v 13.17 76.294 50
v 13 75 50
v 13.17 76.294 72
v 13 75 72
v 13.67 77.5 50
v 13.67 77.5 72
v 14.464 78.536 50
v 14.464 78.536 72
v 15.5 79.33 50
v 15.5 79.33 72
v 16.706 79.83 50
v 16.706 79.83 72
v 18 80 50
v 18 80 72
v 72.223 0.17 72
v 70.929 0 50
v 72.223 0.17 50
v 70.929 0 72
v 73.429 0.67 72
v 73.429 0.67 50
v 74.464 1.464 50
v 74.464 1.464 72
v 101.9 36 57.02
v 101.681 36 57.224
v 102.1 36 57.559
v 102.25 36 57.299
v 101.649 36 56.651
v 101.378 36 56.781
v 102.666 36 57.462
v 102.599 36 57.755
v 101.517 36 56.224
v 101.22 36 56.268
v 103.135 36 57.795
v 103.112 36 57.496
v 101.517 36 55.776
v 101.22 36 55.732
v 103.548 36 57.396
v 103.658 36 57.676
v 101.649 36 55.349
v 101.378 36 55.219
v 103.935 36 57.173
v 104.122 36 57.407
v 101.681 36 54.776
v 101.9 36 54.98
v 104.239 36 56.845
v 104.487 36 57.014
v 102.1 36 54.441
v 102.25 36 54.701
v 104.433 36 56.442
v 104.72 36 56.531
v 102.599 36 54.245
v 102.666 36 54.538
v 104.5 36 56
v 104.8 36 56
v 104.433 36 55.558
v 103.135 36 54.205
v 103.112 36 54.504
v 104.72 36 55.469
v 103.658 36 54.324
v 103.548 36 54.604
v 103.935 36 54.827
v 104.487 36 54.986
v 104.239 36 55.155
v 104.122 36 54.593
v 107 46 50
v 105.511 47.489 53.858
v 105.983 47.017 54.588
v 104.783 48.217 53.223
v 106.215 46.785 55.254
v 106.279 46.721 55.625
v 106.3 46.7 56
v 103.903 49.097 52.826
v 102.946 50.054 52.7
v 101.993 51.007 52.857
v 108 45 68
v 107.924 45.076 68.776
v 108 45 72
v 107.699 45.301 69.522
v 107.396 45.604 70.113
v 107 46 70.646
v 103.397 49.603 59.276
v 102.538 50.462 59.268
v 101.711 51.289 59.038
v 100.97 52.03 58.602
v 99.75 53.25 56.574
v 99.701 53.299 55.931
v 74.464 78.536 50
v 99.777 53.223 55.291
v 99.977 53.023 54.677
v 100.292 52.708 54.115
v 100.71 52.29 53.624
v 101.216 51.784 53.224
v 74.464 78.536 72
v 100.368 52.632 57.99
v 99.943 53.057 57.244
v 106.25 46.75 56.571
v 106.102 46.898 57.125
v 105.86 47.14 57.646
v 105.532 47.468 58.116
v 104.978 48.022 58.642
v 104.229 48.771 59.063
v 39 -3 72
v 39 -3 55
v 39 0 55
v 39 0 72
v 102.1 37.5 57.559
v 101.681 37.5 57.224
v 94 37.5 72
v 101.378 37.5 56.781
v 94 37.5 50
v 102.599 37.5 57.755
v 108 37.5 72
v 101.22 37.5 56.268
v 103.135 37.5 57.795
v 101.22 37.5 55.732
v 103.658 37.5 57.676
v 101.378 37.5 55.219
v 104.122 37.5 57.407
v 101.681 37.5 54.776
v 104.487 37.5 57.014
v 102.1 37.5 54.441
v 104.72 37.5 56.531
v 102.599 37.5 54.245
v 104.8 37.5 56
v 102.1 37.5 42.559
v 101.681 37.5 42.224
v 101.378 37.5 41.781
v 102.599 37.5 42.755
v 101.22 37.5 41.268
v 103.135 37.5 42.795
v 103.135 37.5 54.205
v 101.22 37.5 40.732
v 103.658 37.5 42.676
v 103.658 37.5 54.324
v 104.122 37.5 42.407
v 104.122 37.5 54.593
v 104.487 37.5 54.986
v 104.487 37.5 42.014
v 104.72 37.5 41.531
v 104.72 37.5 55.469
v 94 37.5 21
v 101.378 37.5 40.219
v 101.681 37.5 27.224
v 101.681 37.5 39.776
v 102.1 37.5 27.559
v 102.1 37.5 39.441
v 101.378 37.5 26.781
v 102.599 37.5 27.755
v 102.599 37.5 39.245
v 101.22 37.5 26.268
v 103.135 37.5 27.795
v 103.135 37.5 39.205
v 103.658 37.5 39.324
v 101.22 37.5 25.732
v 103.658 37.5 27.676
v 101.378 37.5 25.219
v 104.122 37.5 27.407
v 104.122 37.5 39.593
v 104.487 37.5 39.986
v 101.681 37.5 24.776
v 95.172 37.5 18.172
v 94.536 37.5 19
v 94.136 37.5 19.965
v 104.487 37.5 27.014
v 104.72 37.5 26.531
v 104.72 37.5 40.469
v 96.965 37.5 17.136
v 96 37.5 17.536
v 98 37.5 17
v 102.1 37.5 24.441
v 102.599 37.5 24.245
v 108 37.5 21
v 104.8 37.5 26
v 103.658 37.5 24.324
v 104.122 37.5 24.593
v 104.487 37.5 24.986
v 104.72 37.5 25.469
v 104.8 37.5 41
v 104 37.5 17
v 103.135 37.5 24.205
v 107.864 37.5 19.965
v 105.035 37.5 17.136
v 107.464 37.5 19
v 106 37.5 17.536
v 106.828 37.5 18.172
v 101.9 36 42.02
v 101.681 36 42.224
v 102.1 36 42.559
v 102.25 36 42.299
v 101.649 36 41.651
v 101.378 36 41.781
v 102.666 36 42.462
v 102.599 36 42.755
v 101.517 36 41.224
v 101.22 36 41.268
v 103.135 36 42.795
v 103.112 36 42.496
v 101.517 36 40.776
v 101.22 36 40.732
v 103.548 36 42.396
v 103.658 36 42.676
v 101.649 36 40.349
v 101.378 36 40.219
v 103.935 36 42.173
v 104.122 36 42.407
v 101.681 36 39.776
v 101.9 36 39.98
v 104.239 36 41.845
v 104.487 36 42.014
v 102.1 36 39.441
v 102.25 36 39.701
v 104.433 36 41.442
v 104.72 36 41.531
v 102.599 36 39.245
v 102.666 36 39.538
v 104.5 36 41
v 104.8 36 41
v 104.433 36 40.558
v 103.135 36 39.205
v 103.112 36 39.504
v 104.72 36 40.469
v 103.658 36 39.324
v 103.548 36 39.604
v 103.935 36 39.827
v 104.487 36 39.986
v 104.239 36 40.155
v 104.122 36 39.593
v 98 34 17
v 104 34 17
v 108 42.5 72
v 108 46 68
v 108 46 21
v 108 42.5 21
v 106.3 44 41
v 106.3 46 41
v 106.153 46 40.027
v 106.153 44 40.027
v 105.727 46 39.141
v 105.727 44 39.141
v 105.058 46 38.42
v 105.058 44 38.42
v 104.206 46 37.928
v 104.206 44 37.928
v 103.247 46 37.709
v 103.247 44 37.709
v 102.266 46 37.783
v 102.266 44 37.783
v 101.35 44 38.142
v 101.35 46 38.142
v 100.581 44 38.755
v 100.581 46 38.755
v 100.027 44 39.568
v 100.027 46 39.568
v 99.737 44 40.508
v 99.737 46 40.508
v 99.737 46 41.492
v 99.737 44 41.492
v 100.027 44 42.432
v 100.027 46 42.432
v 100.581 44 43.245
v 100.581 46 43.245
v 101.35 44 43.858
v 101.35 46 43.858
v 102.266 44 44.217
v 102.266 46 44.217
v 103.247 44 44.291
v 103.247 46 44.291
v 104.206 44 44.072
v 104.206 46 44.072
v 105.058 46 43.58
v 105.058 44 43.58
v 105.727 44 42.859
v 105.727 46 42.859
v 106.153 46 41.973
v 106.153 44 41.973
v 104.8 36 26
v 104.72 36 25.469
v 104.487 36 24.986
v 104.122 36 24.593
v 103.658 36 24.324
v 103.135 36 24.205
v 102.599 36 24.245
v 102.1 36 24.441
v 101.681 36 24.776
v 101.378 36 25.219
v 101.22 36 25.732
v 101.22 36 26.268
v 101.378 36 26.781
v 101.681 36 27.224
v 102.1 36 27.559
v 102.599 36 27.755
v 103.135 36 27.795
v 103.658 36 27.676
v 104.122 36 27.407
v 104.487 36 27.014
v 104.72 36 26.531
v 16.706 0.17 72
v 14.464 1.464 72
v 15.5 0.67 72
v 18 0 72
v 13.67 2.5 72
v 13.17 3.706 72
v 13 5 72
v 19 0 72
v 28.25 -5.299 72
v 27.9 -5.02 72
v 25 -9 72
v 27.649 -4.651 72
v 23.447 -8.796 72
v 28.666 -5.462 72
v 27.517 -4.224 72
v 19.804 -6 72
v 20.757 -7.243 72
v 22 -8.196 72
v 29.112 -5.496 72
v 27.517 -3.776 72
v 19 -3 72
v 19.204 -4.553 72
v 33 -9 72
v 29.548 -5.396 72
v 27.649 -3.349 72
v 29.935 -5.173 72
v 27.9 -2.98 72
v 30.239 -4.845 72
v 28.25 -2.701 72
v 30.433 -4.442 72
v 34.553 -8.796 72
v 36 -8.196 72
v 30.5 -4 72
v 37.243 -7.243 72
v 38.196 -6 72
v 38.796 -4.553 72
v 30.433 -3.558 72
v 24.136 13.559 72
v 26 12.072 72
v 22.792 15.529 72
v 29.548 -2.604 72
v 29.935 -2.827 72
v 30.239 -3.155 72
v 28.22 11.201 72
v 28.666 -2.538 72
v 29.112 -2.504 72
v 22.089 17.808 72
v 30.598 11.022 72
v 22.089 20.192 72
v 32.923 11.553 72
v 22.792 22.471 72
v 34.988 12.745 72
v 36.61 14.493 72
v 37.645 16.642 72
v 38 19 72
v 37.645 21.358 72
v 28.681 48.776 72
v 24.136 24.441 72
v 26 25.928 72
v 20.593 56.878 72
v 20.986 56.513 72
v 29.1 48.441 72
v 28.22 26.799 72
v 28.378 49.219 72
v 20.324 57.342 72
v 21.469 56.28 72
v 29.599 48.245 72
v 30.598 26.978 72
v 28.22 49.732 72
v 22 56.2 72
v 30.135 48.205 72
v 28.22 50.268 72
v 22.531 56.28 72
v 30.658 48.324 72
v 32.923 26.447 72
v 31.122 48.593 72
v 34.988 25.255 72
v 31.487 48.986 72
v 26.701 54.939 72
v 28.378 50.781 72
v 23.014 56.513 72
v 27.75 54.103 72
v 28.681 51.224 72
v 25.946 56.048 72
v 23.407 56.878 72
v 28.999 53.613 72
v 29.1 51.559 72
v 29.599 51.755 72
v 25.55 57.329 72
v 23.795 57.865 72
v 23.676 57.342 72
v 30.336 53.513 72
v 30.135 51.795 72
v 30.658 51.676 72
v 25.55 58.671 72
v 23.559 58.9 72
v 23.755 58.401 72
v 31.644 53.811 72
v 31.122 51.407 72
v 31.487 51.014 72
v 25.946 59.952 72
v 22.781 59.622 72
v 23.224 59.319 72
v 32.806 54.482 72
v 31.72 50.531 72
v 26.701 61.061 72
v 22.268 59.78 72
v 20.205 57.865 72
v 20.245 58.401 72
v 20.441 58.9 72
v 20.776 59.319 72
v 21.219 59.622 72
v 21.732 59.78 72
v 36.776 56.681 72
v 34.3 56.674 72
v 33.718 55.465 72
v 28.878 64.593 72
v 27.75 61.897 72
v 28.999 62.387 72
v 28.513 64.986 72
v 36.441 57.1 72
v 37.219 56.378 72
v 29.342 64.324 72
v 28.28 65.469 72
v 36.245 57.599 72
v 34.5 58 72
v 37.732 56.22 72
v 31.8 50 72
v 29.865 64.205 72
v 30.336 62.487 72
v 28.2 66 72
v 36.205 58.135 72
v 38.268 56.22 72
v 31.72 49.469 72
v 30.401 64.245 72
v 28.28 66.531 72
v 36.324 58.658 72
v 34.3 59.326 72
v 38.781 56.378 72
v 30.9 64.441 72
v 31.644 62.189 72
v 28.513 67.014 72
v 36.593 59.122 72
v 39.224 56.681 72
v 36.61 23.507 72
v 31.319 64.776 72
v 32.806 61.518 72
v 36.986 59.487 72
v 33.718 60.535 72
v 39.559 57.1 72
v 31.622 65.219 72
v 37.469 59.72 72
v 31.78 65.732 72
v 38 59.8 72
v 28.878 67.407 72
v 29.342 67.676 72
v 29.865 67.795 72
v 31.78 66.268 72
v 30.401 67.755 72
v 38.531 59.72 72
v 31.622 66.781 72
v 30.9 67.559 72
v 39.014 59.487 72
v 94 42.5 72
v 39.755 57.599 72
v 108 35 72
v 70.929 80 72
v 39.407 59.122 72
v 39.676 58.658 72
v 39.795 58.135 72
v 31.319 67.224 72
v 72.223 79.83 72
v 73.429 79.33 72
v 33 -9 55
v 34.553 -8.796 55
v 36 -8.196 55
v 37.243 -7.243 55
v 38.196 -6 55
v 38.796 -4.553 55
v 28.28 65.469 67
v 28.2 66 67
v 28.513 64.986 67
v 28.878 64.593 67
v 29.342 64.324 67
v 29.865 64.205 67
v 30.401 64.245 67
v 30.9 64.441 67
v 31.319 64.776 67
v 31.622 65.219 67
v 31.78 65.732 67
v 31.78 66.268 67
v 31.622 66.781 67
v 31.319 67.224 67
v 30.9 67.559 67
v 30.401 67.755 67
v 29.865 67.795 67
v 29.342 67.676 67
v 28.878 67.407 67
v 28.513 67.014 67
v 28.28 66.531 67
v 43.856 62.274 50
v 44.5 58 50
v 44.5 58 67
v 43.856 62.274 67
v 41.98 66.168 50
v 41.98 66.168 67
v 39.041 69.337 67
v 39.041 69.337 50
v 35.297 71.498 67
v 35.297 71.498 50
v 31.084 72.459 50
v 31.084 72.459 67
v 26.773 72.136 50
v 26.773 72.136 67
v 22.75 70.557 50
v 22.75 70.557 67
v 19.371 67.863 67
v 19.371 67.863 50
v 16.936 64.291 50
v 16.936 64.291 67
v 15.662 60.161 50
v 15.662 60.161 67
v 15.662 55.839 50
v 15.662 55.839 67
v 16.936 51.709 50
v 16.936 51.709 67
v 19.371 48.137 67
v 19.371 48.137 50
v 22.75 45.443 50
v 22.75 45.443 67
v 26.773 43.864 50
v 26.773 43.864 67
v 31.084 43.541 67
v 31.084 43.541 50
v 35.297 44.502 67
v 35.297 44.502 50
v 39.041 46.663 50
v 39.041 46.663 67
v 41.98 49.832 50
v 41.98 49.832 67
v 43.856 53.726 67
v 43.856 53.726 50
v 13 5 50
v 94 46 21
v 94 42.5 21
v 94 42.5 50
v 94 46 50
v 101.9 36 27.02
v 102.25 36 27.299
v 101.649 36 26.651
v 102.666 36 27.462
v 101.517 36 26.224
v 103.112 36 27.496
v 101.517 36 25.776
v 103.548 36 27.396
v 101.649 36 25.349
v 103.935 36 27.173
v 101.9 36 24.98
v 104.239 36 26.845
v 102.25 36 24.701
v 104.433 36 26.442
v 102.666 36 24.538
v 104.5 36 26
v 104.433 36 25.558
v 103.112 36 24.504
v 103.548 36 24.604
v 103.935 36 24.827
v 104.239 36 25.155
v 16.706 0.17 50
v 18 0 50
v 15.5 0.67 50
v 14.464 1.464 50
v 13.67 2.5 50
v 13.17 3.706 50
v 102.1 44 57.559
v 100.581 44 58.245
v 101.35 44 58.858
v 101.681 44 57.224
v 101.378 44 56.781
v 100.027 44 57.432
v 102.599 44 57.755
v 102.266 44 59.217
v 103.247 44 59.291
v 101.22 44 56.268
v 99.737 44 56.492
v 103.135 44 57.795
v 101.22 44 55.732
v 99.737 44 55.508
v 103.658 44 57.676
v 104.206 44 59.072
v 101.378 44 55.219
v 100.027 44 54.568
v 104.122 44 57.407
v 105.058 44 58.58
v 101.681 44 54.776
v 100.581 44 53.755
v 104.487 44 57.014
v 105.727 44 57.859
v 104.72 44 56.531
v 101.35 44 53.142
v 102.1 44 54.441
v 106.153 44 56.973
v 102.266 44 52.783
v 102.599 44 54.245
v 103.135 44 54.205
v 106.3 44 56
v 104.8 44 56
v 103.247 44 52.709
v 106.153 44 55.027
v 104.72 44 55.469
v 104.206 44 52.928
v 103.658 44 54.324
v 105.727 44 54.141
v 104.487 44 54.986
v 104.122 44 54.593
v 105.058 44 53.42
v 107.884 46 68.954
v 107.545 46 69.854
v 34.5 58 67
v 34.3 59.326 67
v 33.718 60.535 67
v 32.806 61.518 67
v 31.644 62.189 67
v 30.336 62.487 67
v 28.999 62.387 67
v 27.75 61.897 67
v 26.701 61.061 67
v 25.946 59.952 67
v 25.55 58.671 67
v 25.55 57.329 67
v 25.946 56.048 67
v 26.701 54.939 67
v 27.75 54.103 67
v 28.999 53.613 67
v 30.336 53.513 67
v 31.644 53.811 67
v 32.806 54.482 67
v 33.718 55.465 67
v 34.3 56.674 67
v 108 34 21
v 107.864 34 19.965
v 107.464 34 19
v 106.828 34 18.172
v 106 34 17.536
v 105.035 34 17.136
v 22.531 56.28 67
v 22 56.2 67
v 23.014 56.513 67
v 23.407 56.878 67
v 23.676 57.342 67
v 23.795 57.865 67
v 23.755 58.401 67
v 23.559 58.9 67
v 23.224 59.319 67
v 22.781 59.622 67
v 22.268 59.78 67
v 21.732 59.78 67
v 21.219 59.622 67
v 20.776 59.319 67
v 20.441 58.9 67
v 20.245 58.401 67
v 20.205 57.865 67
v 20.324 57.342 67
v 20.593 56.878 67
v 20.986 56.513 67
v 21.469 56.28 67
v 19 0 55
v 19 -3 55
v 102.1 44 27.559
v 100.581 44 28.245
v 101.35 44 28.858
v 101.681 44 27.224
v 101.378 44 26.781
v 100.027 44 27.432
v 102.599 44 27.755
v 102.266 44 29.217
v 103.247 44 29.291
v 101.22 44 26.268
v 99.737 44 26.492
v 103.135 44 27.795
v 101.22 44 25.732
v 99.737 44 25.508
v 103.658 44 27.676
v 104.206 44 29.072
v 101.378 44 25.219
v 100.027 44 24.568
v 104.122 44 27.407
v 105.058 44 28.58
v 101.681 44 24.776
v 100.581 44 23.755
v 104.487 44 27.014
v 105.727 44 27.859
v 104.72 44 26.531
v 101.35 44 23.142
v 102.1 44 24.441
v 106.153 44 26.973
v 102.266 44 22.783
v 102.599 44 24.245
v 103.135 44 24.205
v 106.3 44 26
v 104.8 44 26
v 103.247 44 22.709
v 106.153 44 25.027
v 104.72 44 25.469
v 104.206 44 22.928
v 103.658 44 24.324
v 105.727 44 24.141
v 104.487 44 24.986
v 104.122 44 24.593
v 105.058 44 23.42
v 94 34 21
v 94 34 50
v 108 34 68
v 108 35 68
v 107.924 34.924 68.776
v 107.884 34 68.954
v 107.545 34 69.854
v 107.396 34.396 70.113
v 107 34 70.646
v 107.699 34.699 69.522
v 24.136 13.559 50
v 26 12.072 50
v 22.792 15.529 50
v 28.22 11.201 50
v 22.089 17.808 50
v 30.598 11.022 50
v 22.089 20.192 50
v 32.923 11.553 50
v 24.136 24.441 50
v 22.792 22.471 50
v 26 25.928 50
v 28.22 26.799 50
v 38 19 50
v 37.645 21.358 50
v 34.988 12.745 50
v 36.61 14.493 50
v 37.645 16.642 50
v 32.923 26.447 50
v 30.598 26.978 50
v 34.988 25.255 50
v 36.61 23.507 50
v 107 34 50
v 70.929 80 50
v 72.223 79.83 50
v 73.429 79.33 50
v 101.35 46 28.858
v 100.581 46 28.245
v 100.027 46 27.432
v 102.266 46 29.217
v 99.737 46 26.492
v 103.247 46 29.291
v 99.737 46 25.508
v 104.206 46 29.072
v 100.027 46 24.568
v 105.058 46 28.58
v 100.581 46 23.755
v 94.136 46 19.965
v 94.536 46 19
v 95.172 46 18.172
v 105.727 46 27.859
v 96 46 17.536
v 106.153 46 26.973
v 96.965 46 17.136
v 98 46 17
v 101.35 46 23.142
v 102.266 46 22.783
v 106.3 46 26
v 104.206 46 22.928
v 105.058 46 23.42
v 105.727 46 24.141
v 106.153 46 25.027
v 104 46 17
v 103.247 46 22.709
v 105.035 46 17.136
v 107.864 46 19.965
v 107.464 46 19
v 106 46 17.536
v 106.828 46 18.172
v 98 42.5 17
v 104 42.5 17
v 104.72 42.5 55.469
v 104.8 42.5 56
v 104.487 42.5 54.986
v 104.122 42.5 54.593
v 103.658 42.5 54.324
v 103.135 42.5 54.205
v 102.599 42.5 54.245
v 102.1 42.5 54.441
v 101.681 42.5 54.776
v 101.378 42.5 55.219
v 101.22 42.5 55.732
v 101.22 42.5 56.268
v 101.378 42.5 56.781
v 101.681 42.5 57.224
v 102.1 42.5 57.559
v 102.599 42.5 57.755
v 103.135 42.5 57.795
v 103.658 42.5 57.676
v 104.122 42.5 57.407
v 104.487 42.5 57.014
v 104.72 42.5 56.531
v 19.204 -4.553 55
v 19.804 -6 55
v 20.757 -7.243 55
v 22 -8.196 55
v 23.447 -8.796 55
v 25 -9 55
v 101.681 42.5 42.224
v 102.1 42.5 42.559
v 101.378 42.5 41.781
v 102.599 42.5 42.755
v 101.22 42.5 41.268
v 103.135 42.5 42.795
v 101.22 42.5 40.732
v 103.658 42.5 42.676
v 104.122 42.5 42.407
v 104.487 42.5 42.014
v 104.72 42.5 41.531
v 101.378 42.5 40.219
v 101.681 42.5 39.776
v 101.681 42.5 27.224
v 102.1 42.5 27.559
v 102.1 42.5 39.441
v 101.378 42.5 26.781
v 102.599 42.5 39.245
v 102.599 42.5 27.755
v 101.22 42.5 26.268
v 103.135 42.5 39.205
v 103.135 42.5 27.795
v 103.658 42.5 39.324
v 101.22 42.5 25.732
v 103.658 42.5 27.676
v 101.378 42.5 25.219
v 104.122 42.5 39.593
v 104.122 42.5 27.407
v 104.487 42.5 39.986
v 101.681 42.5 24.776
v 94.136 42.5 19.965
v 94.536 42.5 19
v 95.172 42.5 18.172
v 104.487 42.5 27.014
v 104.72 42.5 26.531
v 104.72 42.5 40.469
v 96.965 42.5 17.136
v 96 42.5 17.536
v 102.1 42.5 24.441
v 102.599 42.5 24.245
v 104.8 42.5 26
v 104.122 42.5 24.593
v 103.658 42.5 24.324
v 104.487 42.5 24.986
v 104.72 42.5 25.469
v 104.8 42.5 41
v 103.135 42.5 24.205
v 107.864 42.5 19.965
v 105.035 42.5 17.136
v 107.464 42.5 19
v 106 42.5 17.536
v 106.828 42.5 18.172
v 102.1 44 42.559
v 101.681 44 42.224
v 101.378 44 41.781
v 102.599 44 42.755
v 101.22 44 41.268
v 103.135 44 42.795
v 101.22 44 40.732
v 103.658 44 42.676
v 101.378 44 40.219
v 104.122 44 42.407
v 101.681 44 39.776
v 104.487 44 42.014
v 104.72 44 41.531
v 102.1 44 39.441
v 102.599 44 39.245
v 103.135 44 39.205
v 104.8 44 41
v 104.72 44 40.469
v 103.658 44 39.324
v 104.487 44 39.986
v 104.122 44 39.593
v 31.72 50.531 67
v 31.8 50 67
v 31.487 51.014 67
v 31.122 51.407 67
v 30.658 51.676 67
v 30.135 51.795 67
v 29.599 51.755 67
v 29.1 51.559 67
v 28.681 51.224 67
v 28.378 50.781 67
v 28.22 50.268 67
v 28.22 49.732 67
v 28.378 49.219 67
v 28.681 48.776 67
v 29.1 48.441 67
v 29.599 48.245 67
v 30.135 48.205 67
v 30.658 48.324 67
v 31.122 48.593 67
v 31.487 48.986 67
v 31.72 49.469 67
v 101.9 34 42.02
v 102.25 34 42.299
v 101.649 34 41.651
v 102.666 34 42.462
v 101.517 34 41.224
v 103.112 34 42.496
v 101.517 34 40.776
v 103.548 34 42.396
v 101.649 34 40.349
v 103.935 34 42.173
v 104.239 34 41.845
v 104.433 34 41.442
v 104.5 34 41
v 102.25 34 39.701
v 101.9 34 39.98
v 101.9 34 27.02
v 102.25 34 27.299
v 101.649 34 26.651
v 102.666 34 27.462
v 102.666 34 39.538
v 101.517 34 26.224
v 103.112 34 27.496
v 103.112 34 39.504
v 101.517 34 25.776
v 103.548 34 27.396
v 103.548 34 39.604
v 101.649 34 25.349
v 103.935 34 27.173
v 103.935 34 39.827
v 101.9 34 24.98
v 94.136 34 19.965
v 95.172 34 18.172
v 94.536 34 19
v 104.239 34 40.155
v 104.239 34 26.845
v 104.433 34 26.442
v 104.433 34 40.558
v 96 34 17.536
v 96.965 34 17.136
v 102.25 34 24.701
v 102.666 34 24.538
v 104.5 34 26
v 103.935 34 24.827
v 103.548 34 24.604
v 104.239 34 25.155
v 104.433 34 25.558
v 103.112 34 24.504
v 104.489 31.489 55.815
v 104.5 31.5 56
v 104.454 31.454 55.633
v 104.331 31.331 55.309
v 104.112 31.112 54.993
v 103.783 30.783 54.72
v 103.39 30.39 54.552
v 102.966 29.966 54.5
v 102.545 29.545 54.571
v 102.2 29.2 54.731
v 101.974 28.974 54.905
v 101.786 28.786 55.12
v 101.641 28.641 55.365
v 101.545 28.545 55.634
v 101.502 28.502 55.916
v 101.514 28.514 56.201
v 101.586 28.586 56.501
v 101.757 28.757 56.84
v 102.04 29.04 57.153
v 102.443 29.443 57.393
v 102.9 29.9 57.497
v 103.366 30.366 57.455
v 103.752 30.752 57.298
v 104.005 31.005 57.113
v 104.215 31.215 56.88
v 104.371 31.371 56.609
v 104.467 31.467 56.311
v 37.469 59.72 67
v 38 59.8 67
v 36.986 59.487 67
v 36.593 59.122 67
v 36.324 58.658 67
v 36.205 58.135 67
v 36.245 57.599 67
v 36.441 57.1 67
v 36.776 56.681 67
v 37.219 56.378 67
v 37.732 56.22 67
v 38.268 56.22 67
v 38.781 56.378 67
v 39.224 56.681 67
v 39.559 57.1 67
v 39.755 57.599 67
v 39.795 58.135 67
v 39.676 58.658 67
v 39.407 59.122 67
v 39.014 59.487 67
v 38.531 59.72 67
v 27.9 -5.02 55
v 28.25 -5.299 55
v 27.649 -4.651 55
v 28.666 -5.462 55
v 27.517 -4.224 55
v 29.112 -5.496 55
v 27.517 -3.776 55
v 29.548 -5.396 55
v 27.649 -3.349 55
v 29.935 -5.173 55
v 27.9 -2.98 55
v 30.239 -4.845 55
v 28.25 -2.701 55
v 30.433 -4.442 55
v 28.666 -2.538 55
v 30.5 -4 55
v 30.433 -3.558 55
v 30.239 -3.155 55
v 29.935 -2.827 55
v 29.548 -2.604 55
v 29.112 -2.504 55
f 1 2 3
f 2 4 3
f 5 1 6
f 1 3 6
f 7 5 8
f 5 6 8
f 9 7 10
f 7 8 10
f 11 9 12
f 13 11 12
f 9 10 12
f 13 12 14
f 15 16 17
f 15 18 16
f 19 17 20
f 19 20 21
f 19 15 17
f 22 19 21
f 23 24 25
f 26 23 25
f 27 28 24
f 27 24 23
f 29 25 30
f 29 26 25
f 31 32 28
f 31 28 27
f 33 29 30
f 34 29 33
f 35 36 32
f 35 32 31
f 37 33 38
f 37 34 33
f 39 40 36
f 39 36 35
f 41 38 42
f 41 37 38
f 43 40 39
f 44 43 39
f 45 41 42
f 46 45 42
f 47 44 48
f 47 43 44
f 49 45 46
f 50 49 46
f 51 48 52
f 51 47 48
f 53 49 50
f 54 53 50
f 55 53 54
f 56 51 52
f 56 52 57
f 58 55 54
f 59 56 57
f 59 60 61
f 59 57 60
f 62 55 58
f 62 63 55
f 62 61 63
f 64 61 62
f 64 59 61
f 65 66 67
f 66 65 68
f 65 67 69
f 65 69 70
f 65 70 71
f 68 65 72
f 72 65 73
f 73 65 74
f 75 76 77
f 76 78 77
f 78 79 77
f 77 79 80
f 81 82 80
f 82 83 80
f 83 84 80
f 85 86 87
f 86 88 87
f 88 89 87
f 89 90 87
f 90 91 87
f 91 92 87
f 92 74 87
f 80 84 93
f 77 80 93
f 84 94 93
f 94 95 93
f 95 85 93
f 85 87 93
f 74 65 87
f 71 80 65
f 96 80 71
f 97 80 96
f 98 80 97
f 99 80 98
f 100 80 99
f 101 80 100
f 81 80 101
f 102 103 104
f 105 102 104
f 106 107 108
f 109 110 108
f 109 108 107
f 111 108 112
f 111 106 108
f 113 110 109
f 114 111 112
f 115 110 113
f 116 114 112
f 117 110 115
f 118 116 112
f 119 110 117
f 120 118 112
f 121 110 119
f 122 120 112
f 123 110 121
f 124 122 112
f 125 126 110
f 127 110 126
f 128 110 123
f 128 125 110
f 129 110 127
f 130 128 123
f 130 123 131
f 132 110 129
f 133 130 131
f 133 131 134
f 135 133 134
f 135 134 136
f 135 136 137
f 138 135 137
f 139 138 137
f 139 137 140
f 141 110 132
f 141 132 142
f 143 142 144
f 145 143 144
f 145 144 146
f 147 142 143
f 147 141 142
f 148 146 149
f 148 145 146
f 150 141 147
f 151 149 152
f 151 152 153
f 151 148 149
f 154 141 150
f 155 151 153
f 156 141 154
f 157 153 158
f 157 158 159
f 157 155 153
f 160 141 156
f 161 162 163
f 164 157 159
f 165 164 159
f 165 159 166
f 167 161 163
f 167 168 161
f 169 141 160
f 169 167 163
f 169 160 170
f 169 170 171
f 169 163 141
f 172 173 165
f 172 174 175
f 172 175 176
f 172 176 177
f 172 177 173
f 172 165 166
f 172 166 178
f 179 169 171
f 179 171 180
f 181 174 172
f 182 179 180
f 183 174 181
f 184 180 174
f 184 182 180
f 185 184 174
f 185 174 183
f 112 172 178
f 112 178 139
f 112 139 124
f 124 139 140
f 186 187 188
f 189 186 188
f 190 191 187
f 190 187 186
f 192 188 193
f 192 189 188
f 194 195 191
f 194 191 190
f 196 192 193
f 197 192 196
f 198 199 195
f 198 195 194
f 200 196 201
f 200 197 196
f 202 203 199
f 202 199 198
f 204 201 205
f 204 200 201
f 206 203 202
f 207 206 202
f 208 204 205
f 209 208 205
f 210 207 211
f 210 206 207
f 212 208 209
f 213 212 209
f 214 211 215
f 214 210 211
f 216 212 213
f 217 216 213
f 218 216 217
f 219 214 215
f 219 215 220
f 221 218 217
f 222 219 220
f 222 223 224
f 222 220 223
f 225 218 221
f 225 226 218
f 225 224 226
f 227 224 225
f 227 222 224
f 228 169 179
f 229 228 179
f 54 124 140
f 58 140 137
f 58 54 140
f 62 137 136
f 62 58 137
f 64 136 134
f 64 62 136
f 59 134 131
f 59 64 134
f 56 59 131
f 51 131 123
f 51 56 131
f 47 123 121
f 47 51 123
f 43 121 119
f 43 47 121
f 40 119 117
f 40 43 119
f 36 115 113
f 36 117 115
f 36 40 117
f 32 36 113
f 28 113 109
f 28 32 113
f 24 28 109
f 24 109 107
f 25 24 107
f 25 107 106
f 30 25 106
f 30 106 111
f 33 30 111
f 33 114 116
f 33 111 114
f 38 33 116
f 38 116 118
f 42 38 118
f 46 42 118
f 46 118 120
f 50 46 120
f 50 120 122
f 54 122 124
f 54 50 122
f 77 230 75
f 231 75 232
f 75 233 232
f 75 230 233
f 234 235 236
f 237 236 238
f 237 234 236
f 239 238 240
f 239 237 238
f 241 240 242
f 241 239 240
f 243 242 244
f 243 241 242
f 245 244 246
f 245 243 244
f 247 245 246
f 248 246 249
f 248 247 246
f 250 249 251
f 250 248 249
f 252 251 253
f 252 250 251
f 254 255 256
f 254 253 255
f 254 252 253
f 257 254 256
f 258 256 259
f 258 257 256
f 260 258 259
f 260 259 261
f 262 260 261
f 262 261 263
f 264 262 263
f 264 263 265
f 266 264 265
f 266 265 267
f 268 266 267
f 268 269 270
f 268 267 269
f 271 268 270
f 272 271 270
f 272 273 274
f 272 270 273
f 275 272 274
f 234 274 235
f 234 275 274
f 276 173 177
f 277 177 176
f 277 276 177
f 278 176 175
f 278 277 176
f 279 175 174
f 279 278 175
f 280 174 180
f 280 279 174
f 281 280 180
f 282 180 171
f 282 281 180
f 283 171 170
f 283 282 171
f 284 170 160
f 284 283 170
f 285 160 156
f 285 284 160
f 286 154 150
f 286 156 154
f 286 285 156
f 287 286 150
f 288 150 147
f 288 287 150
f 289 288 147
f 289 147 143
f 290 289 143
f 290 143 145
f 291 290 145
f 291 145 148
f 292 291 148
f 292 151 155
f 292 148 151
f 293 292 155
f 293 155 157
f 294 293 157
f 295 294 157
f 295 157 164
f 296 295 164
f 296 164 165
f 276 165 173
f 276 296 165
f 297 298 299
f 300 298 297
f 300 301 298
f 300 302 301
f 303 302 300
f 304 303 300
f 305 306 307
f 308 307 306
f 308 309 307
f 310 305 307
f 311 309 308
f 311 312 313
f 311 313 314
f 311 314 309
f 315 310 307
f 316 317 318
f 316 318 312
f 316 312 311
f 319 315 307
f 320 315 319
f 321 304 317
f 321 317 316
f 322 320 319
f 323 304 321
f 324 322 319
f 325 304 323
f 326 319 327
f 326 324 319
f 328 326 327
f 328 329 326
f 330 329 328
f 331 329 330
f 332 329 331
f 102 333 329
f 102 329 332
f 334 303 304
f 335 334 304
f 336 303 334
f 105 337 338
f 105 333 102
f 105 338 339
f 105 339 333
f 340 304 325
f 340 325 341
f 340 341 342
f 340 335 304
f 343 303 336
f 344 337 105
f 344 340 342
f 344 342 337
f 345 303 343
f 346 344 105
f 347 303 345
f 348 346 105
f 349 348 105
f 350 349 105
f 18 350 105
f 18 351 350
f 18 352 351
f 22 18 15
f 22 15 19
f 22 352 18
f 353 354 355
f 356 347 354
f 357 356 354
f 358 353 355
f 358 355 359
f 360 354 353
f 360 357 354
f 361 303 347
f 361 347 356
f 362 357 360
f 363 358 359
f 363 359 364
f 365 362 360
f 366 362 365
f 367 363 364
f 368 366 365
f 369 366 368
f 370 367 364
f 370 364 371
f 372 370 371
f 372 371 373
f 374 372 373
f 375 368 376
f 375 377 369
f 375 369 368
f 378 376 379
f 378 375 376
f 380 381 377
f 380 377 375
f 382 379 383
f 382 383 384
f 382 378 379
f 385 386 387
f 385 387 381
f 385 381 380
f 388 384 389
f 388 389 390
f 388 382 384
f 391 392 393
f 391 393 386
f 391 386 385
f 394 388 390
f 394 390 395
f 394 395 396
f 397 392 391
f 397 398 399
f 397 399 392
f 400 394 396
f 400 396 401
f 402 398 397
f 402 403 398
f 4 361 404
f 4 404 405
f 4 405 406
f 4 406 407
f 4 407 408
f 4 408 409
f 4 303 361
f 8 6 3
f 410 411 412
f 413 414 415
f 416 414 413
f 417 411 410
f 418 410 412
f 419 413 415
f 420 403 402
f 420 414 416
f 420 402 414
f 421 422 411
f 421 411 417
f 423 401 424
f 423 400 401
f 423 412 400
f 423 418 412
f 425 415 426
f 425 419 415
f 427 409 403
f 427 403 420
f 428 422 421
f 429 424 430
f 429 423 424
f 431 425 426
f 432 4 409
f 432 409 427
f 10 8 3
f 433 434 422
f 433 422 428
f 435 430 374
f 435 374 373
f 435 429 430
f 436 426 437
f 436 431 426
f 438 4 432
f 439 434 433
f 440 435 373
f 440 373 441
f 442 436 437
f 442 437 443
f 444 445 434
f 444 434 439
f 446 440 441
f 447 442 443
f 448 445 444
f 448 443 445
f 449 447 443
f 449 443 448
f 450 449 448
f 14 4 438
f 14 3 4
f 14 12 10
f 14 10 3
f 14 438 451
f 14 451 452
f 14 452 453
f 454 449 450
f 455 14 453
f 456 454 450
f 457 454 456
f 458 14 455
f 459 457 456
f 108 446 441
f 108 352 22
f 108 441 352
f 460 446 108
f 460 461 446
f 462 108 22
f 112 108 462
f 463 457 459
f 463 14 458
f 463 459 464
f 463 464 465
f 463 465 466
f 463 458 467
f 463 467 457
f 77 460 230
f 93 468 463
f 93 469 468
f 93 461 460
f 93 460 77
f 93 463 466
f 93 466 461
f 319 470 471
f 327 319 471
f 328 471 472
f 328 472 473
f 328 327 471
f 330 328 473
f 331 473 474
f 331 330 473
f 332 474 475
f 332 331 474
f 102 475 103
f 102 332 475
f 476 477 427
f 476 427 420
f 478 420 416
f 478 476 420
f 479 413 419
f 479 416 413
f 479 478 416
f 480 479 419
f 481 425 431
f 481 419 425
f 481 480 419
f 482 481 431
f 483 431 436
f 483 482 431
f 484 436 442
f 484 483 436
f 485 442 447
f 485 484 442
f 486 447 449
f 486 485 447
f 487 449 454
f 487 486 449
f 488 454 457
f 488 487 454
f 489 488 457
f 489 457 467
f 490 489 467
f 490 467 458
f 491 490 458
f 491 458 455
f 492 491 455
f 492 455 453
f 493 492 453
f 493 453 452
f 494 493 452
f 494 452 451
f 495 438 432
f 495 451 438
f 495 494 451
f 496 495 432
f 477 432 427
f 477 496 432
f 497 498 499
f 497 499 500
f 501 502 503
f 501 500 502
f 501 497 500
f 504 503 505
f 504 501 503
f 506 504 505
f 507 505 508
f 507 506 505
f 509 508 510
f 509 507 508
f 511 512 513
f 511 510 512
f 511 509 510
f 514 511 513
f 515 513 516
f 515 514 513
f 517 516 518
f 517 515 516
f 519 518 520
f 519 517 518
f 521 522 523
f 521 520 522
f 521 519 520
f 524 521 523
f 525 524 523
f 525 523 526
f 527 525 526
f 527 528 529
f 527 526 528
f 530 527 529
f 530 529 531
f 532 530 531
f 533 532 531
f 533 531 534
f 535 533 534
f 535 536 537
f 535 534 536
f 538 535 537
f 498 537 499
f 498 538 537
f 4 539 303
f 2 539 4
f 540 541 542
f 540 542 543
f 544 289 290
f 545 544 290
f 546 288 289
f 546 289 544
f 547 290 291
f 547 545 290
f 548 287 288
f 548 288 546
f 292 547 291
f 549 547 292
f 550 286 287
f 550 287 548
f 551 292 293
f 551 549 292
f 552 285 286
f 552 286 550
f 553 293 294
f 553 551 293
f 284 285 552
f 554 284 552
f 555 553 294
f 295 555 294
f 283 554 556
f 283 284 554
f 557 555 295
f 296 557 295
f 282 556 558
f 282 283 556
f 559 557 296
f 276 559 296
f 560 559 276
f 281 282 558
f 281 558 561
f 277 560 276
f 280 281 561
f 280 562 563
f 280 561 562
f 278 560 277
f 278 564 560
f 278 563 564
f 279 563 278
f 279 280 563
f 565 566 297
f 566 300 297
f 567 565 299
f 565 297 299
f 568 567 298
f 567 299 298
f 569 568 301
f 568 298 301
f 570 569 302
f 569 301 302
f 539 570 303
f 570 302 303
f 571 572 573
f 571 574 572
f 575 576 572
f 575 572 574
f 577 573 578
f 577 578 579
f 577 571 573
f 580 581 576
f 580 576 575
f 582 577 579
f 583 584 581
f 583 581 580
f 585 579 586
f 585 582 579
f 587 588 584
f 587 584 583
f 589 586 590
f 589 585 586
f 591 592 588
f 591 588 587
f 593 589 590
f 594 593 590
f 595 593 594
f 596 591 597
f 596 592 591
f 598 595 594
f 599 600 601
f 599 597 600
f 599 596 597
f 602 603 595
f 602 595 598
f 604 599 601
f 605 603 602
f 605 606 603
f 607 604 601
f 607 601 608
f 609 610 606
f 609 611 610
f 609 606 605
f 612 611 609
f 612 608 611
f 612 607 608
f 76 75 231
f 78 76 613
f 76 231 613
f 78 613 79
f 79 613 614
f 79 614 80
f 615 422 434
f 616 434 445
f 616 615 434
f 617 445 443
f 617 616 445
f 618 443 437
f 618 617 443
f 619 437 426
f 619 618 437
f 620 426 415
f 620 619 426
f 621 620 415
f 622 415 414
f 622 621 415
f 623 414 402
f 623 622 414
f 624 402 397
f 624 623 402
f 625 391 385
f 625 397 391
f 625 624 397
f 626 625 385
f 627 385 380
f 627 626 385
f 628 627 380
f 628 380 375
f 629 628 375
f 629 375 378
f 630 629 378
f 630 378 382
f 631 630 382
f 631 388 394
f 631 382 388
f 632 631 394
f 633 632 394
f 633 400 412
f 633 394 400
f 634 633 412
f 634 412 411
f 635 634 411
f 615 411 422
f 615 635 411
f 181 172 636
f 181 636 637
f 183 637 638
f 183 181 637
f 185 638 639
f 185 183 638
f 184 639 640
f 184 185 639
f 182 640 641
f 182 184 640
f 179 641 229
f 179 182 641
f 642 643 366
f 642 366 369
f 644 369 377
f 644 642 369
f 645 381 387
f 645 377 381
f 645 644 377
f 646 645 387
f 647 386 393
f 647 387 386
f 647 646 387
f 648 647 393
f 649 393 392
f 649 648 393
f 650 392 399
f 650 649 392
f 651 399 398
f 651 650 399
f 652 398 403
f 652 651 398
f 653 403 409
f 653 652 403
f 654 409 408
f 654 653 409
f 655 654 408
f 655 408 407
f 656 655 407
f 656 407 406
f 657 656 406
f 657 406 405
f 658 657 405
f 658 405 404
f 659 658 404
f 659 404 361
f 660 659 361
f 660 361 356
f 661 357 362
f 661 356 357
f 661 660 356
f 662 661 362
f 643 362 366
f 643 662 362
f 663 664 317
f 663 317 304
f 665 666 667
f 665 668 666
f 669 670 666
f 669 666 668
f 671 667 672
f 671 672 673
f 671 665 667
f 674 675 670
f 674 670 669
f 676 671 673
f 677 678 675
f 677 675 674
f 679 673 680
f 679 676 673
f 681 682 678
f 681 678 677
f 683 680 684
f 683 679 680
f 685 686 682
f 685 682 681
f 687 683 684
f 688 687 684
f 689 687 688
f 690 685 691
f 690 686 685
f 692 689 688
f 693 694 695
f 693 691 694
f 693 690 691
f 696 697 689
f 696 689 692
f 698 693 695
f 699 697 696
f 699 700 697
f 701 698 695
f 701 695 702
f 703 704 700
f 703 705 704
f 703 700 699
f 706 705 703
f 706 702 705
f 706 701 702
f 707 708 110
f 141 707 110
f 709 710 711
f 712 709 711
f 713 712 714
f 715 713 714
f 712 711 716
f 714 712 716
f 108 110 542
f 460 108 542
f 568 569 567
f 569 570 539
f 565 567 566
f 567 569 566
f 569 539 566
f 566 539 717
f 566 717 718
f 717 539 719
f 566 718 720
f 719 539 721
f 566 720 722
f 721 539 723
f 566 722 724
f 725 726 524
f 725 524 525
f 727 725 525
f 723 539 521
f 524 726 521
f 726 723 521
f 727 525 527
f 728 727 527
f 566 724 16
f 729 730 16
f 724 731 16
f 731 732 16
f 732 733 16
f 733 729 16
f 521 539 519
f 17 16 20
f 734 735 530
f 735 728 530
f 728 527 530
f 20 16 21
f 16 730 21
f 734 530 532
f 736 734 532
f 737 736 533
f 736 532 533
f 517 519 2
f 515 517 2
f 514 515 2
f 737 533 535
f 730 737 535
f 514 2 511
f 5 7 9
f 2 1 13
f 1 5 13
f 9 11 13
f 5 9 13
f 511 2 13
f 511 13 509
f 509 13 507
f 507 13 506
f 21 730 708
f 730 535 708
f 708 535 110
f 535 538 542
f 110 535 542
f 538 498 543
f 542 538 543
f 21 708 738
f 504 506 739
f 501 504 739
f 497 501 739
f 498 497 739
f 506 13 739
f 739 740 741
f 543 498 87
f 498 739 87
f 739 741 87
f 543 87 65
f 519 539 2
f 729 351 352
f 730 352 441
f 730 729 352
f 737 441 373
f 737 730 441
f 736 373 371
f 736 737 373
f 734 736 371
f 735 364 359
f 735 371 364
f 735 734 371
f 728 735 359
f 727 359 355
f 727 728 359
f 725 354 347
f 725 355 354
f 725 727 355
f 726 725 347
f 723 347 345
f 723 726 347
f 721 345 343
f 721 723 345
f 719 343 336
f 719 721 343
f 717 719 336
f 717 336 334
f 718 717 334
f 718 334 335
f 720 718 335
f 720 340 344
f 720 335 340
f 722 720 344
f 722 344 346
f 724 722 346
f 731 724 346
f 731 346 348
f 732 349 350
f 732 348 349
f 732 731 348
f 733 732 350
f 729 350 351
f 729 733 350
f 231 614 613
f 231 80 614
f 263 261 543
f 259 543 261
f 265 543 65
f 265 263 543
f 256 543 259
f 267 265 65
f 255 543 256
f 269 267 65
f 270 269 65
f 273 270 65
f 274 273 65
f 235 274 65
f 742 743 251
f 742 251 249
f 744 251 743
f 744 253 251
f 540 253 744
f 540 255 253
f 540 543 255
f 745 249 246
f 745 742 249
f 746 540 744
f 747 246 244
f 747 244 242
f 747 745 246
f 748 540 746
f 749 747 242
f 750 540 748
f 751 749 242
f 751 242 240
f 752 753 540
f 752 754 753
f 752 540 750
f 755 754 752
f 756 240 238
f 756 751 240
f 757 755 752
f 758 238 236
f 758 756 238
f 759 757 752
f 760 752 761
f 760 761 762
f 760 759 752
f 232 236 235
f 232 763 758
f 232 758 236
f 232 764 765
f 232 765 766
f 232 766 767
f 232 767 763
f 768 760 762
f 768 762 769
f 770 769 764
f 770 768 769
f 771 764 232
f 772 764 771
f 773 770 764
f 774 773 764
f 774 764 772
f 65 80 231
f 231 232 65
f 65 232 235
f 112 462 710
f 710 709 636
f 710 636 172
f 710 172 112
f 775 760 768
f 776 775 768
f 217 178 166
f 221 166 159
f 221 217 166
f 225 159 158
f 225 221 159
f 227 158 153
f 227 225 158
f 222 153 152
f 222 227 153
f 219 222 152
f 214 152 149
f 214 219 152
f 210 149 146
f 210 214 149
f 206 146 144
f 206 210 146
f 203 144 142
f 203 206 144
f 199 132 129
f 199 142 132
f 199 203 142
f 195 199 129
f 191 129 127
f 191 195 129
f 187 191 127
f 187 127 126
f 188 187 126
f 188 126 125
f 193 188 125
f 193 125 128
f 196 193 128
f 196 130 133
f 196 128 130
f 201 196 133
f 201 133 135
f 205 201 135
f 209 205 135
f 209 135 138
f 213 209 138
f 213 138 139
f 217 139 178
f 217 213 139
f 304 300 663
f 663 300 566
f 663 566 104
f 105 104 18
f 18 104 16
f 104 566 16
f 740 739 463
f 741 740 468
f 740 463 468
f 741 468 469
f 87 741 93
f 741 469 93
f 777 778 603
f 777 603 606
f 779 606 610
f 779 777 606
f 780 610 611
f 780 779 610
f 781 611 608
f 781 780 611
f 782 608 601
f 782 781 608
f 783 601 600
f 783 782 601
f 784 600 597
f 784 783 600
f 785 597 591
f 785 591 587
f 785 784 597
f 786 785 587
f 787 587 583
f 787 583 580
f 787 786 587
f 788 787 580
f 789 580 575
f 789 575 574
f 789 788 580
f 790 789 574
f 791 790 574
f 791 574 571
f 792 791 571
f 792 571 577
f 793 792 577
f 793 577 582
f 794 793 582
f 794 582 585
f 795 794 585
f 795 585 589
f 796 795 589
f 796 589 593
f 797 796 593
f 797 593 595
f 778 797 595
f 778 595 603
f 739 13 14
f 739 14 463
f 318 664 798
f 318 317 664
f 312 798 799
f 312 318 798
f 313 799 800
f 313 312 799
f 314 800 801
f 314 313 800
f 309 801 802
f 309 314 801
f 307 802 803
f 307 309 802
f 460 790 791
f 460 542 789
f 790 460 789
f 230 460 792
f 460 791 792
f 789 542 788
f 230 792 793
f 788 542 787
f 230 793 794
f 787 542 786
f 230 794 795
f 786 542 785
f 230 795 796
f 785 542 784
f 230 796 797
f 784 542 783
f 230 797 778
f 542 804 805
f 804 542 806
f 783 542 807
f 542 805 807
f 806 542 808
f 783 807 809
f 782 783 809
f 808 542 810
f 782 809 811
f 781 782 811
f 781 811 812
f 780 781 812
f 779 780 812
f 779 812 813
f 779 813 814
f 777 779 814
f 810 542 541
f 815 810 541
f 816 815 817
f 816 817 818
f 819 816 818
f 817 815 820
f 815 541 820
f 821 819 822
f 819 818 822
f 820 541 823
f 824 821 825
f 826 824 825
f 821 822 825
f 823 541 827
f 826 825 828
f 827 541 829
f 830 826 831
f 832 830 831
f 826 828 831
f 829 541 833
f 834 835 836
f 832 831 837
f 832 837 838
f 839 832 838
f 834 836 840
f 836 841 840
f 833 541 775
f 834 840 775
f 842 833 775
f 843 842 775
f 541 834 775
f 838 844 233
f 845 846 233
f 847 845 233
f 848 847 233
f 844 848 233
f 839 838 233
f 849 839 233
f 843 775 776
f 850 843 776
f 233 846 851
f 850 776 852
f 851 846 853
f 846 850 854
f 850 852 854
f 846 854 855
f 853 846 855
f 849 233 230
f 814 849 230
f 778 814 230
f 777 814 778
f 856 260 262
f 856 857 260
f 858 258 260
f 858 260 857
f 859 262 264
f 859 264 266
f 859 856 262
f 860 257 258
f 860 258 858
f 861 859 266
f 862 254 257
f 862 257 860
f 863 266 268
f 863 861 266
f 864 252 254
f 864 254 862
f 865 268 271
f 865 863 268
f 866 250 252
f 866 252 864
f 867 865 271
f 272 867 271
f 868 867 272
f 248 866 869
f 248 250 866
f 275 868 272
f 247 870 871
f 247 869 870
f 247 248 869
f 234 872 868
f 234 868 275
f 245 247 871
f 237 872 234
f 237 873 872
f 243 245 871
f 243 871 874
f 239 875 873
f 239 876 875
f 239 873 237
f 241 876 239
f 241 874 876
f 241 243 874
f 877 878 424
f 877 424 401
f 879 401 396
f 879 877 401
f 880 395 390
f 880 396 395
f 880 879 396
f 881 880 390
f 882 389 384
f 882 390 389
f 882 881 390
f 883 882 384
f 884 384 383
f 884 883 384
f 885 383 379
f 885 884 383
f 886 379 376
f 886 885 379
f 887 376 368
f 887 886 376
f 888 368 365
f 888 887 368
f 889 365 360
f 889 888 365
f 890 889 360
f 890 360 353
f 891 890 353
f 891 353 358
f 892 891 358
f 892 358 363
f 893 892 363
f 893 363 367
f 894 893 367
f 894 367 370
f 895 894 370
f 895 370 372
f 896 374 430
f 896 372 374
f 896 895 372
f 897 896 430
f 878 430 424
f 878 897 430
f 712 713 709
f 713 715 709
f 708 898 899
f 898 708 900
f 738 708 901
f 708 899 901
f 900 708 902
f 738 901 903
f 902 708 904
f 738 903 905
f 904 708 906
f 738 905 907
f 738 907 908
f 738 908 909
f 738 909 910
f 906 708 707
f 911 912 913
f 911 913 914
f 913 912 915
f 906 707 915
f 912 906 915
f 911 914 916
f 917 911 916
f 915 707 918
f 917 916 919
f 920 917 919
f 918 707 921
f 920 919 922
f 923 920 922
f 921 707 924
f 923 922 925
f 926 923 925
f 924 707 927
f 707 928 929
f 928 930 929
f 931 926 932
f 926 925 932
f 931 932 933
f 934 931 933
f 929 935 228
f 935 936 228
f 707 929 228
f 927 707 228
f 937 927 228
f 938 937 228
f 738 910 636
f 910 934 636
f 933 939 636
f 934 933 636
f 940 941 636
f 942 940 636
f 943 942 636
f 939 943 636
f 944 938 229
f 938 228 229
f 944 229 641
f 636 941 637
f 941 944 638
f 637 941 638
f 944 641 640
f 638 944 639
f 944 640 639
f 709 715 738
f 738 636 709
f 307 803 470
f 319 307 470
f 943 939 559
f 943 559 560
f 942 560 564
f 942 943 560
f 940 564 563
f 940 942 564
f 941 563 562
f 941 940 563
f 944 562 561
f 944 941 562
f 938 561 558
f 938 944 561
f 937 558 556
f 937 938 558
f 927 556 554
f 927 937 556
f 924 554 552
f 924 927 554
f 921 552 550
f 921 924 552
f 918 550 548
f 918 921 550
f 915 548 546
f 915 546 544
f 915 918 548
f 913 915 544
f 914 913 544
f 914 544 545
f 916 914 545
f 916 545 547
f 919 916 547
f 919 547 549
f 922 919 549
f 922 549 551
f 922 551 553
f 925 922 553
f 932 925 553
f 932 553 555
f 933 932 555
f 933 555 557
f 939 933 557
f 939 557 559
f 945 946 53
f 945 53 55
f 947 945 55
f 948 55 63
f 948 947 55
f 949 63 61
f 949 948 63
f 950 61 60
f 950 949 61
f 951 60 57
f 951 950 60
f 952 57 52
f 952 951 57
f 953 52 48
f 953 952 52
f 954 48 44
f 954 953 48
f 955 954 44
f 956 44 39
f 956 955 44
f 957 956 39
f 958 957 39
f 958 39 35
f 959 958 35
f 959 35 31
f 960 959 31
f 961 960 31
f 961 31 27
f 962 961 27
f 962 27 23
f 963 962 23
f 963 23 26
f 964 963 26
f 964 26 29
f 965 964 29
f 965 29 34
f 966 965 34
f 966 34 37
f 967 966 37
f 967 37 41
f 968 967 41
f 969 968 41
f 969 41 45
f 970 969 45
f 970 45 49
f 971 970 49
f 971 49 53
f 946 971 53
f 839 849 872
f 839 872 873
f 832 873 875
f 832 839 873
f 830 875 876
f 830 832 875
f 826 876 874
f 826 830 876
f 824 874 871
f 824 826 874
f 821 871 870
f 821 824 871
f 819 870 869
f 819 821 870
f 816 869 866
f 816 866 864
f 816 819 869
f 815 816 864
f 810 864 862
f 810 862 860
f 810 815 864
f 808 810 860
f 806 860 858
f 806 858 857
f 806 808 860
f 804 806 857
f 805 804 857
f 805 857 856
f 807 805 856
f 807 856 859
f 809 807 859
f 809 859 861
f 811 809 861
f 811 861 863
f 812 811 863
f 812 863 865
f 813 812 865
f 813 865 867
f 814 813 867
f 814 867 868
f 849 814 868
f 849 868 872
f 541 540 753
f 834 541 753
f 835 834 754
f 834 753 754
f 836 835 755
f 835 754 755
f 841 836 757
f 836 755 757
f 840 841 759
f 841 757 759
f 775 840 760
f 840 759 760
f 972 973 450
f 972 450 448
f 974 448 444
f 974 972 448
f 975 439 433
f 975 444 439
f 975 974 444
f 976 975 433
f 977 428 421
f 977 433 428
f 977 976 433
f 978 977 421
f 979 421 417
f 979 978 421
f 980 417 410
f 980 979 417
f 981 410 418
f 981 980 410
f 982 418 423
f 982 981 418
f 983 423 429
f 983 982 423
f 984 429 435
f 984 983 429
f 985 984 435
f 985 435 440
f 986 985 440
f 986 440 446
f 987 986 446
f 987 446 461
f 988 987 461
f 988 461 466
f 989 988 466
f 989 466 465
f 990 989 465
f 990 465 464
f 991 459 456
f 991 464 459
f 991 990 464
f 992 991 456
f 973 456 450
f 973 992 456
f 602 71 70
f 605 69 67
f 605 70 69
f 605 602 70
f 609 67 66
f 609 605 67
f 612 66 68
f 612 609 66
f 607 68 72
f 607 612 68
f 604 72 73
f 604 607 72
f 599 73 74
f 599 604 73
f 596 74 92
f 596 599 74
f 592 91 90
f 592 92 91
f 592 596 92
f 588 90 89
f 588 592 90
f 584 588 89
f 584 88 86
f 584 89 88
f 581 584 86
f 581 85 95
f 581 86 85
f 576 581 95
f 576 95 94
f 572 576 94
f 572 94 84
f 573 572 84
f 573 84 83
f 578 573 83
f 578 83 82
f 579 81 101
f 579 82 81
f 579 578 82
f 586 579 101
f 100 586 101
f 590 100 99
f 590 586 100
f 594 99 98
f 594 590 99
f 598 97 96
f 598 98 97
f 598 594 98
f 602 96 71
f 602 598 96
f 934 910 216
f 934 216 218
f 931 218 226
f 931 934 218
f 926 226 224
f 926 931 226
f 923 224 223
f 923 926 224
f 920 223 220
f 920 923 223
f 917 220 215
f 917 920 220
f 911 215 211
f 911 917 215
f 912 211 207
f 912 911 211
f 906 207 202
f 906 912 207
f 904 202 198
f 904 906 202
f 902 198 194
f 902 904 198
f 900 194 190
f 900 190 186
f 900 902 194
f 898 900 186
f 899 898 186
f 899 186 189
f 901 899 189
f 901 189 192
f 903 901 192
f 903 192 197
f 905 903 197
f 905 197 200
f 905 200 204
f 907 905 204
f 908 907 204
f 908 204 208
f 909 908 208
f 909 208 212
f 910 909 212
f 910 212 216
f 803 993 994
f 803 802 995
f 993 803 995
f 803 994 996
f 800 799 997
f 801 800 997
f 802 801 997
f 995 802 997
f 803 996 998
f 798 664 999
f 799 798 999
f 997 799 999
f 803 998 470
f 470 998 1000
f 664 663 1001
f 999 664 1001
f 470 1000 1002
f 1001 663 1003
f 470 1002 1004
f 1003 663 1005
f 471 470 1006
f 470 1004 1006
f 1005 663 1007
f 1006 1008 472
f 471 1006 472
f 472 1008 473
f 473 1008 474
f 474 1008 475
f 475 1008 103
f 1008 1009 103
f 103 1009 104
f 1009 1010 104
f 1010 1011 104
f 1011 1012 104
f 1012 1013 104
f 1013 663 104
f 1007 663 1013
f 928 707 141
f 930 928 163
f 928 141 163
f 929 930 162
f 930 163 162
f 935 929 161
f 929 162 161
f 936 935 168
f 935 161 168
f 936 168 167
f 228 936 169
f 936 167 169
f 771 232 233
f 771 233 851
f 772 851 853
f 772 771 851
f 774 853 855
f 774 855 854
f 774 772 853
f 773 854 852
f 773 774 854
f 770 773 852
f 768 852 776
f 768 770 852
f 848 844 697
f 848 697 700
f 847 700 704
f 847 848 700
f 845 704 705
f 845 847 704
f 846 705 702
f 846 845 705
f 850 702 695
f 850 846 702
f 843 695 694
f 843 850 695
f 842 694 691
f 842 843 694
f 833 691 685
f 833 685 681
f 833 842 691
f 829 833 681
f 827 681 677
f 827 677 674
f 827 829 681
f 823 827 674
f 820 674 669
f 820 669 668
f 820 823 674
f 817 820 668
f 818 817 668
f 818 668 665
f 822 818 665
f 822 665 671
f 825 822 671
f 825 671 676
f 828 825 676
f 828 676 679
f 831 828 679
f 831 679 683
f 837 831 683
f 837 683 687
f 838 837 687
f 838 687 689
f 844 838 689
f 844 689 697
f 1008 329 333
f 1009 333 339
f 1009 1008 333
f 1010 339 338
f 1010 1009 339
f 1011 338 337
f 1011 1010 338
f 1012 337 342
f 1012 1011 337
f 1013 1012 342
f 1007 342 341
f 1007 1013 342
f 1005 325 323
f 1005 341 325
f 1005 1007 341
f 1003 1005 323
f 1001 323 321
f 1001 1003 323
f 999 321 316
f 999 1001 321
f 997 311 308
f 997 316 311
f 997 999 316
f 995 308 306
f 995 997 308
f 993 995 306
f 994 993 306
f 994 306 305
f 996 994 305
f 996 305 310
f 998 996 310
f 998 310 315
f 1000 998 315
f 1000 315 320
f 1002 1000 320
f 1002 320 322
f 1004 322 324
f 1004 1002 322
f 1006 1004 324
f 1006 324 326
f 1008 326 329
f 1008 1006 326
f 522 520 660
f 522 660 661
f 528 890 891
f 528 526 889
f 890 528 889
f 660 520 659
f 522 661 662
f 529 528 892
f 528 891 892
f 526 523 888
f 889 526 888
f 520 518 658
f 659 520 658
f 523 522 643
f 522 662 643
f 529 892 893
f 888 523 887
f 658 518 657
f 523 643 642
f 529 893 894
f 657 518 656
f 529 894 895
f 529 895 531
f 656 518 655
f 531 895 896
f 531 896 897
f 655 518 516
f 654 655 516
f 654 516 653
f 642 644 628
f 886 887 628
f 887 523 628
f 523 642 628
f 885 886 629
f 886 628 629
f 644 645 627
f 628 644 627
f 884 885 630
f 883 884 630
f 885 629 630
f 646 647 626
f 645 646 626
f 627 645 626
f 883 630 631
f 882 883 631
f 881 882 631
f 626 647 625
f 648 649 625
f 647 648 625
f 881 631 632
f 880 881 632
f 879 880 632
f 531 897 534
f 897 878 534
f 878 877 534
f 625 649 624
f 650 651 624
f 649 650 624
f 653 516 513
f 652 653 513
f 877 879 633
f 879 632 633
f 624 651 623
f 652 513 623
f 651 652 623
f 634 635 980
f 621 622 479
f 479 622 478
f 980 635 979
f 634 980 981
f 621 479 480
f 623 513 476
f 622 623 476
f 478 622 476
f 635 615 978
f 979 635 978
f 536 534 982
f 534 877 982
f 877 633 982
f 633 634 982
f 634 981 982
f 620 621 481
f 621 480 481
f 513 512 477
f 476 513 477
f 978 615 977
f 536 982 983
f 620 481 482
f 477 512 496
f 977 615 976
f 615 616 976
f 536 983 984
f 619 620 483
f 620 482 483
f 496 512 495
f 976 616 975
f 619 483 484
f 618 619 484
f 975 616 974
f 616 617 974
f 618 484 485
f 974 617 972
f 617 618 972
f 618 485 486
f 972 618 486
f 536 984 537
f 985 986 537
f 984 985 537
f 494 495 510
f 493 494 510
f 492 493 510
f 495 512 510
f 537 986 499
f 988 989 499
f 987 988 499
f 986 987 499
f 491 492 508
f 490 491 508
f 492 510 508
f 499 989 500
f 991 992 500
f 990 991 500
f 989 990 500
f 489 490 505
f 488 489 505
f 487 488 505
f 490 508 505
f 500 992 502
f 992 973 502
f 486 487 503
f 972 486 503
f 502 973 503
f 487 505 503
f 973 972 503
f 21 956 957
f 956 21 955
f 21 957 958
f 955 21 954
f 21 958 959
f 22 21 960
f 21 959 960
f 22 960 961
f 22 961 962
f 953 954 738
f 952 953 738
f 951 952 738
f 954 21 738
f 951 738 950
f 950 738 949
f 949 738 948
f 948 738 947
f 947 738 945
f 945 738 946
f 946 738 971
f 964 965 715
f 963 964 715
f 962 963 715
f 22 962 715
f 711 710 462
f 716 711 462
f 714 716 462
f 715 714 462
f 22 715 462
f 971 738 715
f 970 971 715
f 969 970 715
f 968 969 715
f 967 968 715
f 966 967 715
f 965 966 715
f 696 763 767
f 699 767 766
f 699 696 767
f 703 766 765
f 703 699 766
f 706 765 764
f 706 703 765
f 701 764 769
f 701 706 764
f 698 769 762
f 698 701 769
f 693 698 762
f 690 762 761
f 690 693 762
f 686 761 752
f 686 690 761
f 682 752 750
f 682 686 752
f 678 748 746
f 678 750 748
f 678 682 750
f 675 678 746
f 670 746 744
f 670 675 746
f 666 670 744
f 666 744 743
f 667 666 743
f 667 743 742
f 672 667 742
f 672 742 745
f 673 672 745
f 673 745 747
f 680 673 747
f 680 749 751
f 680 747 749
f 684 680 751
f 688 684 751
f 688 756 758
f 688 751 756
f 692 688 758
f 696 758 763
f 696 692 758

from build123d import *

# Parameters (mm, degrees)
CYLINDER038_R       = 1.8
CYLINDER038_DEPTH   = 20
ARRAY001017_COUNT   = 4
CYLINDER031_R       = 4.5
CYLINDER031_DEPTH   = 6
CYLINDER030_R       = 16
CYLINDER030_DEPTH   = 5
CYLINDER032_R       = 14.5
CYLINDER032_DEPTH   = 30
CYLINDER033_R       = 1.8
CYLINDER033_DEPTH   = 8
CYLINDER035_R       = 1.5
CYLINDER035_DEPTH   = 10
CYLINDER034_R       = 3.3
CYLINDER034_DEPTH   = 20
ARRAY001002_Z_COUNT = 3
ARRAY001002_Z_PITCH = 15
BOX006_W            = 14
BOX006_H            = 5
BOX006_DEPTH        = 55
CYLINDER017_R       = 8
CYLINDER017_DEPTH   = 24
BOX005_W            = 14
BOX005_H            = 12
BOX005_DEPTH        = 55
FILLET006_R         = 4
CYLINDER039_R       = 1.5
CYLINDER039_DEPTH   = 30
BOX018_W            = 20
BOX018_H            = 10
BOX018_DEPTH        = 17
FILLET007_R         = 6
BOX004_W            = 95
BOX004_H            = 80
BOX004_DEPTH        = 22
CHAMFER_SIZE        = 35
FILLET005_R         = 5


with BuildPart() as lead_nut_attachment_bolt_hole_array:
    # Cylinder038 → Cylinder038 (new body)
    with BuildSketch(Plane(origin=(0, -8, -5), x_dir=(1, 0, 0), z_dir=(0, 0, 1))):
        Circle(CYLINDER038_R)
    extrude(amount=CYLINDER038_DEPTH)

    # Array001017: lead nut attachment bolt hole array ×4 about axis
    array001017_axis = Axis((0, 0, 0), (0, 0, 1))


with BuildPart() as lead_nut_attachment_bolt_hole_array_1:
    add(lead_nut_attachment_bolt_hole_array.part)
    for i in range(1, ARRAY001017_COUNT):
        add(lead_nut_attachment_bolt_hole_array.part.rotate(array001017_axis, i * 360 / ARRAY001017_COUNT))


with BuildPart() as hole_fusion001:
    # Cylinder031 → Cylinder031 (new body)
    with BuildSketch(Plane.XY):
        Circle(CYLINDER031_R)
    extrude(amount=CYLINDER031_DEPTH)

    # Fusion009: union lead nut attachment bolt hole array
    add(lead_nut_attachment_bolt_hole_array_1.part)


with BuildPart() as lean_nut_attachment_clone:
    # Cylinder030 → Cylinder030 (new body)
    with BuildSketch(Plane.XY):
        Circle(CYLINDER030_R)
    extrude(amount=CYLINDER030_DEPTH)

    # Cut005: cut hole fusion001
    add(hole_fusion001.part, mode=Mode.SUBTRACT)


with BuildPart() as lean_nut_attachment_clone_1:
    # Body001 placement: moved
    add(lean_nut_attachment_clone.part.moved(Location((17, 58, 17))))


with BuildPart() as backlash_nut_disk_hole:
    # Cylinder032 → Cylinder032 (new body)
    with BuildSketch(Plane(origin=(17, 58, -5), x_dir=(1, 0, 0), z_dir=(0, 0, 1))):
        Circle(CYLINDER032_R)
    extrude(amount=CYLINDER032_DEPTH)


with BuildPart() as attachment_hole001:
    # Cylinder033 → Cylinder033 (new body)
    with BuildSketch(Plane(origin=(0, 0, 0), x_dir=(1, 0, 0), z_dir=(0, 1, 0))):
        Circle(CYLINDER033_R)
    extrude(amount=CYLINDER033_DEPTH)


with BuildPart() as screwed_hole:
    # Cylinder035 → Cylinder035 (new body)
    with BuildSketch(Plane(origin=(0, -10, 0), x_dir=(1, 0, 0), z_dir=(0, 1, 0))):
        Circle(CYLINDER035_R)
    extrude(amount=CYLINDER035_DEPTH)


with BuildPart() as attachment_hole_array001:
    # Cylinder034 → Cylinder034 (new body)
    with BuildSketch(Plane(origin=(0, 8, 0), x_dir=(1, 0, 0), z_dir=(0, 1, 0))):
        Circle(CYLINDER034_R)
    extrude(amount=CYLINDER034_DEPTH)

    # Fusion013: union attachment hole001, screwed hole
    add(attachment_hole001.part)
    add(screwed_hole.part)

    # Array001002 Z: attachment hole array001 ×3


with BuildPart() as attachment_hole_array001_1:
    add(attachment_hole_array001.part)
    with Locations(*[(0, 0, i * ARRAY001002_Z_PITCH) for i in range(1, ARRAY001002_Z_COUNT)]):
        add(attachment_hole_array001.part)


with BuildPart() as attachment_hole_array001_2:
    # Array001002 placement: moved
    add(attachment_hole_array001_1.part.moved(Location((90, 36, -24))))


with BuildPart() as top_attachment_connector_extract:
    # Box006 → Box006 (new body)
    with BuildSketch(Plane(origin=(81, 37.5, -33), x_dir=(1, 0, 0), z_dir=(0, 0, 1))):
        with Locations((7, 2.5)):
            Rectangle(BOX006_W, BOX006_H)
    extrude(amount=BOX006_DEPTH)


with BuildPart() as mblock_middle_hole_fusion:
    # Cylinder017 → Cylinder017 (new body)
    with BuildSketch(Plane(origin=(17, 19, 0), x_dir=(1, 0, 0), z_dir=(0, 0, 1))):
        Circle(CYLINDER017_R)
    extrude(amount=CYLINDER017_DEPTH)

    # Fusion010: union backlash nut disk hole, attachment hole array001, top_attachment_connector_extract
    add(backlash_nut_disk_hole.part)
    add(attachment_hole_array001_2.part)
    add(top_attachment_connector_extract.part)


with BuildPart() as top_attachment_connector_fillet:
    # Box005 → Box005 (new body)
    with BuildSketch(Plane(origin=(81, 34, -33), x_dir=(1, 0, 0), z_dir=(0, 0, 1))):
        with Locations((7, 6)):
            Rectangle(BOX005_W, BOX005_H)
    extrude(amount=BOX005_DEPTH)

    # Fillet006
    fillet006_edges = [top_attachment_connector_fillet.edges().sort_by_distance(p)[0] for p in [
        (81, 40, 22),
        (81, 40, -33),
        (95, 40, 22),
        (95, 40, -33),
    ]]
    fillet(fillet006_edges, radius=FILLET006_R)


with BuildPart() as mblock_middle_end_stop_pusher_hole:
    # Cylinder039 → Cylinder039 (new body)
    with BuildSketch(Plane(origin=(10, 5, 0), x_dir=(1, 0, 0), z_dir=(0, 0, 1))):
        Circle(CYLINDER039_R)
    extrude(amount=CYLINDER039_DEPTH)


with BuildPart() as mblock_middle_end_stop_pusher_cut:
    # Box018 → Box018 (new body)
    with BuildSketch(Plane.XY):
        with Locations((10, 5)):
            Rectangle(BOX018_W, BOX018_H)
    extrude(amount=BOX018_DEPTH)

    # Fillet007
    fillet007_edges = [mblock_middle_end_stop_pusher_cut.edges().sort_by_distance(p)[0] for p in [
        (0, 0, 8.5),
        (20, 0, 8.5),
    ]]
    fillet(fillet007_edges, radius=FILLET007_R)

    # Cut014: cut mblock middle end stop pusher hole
    add(mblock_middle_end_stop_pusher_hole.part, mode=Mode.SUBTRACT)


with BuildPart() as mblock_middle_end_stop_pusher_cut_1:
    # Cut014 placement: moved
    add(mblock_middle_end_stop_pusher_cut.part.moved(Location((6, -9, 5))))


with BuildPart() as mblock_middle_fusion:
    # Box004 → Box004 (new body)
    with BuildSketch(Plane.XY):
        with Locations((47.5, 40)):
            Rectangle(BOX004_W, BOX004_H)
    extrude(amount=BOX004_DEPTH)

    # Chamfer
    chamfer_edges = [mblock_middle_fusion.edges().sort_by_distance(p)[0] for p in [
        (95, 0, 11),
        (95, 80, 11),
    ]]
    chamfer(chamfer_edges, length=CHAMFER_SIZE)

    # Fillet005
    fillet005_edges = [mblock_middle_fusion.edges().sort_by_distance(p)[0] for p in [
        (60, 0, 11),
        (60, 80, 11),
        (0, 80, 11),
        (0, 0, 11),
    ]]
    fillet(fillet005_edges, radius=FILLET005_R)

    # Fusion012: union top attachment connector fillet, mblock middle end stop pusher cut
    add(top_attachment_connector_fillet.part)
    add(mblock_middle_end_stop_pusher_cut_1.part)

    # Cut006: cut mblock middle hole fusion
    add(mblock_middle_hole_fusion.part, mode=Mode.SUBTRACT)

    # Fusion011: union lean nut attachment clone
    add(lean_nut_attachment_clone_1.part)


with BuildPart() as mblock_middle_fusion_1:
    # Fusion011 placement: moved
    add(mblock_middle_fusion.part.moved(Location((13, 0, 50))))


solid = mblock_middle_fusion_1.part
